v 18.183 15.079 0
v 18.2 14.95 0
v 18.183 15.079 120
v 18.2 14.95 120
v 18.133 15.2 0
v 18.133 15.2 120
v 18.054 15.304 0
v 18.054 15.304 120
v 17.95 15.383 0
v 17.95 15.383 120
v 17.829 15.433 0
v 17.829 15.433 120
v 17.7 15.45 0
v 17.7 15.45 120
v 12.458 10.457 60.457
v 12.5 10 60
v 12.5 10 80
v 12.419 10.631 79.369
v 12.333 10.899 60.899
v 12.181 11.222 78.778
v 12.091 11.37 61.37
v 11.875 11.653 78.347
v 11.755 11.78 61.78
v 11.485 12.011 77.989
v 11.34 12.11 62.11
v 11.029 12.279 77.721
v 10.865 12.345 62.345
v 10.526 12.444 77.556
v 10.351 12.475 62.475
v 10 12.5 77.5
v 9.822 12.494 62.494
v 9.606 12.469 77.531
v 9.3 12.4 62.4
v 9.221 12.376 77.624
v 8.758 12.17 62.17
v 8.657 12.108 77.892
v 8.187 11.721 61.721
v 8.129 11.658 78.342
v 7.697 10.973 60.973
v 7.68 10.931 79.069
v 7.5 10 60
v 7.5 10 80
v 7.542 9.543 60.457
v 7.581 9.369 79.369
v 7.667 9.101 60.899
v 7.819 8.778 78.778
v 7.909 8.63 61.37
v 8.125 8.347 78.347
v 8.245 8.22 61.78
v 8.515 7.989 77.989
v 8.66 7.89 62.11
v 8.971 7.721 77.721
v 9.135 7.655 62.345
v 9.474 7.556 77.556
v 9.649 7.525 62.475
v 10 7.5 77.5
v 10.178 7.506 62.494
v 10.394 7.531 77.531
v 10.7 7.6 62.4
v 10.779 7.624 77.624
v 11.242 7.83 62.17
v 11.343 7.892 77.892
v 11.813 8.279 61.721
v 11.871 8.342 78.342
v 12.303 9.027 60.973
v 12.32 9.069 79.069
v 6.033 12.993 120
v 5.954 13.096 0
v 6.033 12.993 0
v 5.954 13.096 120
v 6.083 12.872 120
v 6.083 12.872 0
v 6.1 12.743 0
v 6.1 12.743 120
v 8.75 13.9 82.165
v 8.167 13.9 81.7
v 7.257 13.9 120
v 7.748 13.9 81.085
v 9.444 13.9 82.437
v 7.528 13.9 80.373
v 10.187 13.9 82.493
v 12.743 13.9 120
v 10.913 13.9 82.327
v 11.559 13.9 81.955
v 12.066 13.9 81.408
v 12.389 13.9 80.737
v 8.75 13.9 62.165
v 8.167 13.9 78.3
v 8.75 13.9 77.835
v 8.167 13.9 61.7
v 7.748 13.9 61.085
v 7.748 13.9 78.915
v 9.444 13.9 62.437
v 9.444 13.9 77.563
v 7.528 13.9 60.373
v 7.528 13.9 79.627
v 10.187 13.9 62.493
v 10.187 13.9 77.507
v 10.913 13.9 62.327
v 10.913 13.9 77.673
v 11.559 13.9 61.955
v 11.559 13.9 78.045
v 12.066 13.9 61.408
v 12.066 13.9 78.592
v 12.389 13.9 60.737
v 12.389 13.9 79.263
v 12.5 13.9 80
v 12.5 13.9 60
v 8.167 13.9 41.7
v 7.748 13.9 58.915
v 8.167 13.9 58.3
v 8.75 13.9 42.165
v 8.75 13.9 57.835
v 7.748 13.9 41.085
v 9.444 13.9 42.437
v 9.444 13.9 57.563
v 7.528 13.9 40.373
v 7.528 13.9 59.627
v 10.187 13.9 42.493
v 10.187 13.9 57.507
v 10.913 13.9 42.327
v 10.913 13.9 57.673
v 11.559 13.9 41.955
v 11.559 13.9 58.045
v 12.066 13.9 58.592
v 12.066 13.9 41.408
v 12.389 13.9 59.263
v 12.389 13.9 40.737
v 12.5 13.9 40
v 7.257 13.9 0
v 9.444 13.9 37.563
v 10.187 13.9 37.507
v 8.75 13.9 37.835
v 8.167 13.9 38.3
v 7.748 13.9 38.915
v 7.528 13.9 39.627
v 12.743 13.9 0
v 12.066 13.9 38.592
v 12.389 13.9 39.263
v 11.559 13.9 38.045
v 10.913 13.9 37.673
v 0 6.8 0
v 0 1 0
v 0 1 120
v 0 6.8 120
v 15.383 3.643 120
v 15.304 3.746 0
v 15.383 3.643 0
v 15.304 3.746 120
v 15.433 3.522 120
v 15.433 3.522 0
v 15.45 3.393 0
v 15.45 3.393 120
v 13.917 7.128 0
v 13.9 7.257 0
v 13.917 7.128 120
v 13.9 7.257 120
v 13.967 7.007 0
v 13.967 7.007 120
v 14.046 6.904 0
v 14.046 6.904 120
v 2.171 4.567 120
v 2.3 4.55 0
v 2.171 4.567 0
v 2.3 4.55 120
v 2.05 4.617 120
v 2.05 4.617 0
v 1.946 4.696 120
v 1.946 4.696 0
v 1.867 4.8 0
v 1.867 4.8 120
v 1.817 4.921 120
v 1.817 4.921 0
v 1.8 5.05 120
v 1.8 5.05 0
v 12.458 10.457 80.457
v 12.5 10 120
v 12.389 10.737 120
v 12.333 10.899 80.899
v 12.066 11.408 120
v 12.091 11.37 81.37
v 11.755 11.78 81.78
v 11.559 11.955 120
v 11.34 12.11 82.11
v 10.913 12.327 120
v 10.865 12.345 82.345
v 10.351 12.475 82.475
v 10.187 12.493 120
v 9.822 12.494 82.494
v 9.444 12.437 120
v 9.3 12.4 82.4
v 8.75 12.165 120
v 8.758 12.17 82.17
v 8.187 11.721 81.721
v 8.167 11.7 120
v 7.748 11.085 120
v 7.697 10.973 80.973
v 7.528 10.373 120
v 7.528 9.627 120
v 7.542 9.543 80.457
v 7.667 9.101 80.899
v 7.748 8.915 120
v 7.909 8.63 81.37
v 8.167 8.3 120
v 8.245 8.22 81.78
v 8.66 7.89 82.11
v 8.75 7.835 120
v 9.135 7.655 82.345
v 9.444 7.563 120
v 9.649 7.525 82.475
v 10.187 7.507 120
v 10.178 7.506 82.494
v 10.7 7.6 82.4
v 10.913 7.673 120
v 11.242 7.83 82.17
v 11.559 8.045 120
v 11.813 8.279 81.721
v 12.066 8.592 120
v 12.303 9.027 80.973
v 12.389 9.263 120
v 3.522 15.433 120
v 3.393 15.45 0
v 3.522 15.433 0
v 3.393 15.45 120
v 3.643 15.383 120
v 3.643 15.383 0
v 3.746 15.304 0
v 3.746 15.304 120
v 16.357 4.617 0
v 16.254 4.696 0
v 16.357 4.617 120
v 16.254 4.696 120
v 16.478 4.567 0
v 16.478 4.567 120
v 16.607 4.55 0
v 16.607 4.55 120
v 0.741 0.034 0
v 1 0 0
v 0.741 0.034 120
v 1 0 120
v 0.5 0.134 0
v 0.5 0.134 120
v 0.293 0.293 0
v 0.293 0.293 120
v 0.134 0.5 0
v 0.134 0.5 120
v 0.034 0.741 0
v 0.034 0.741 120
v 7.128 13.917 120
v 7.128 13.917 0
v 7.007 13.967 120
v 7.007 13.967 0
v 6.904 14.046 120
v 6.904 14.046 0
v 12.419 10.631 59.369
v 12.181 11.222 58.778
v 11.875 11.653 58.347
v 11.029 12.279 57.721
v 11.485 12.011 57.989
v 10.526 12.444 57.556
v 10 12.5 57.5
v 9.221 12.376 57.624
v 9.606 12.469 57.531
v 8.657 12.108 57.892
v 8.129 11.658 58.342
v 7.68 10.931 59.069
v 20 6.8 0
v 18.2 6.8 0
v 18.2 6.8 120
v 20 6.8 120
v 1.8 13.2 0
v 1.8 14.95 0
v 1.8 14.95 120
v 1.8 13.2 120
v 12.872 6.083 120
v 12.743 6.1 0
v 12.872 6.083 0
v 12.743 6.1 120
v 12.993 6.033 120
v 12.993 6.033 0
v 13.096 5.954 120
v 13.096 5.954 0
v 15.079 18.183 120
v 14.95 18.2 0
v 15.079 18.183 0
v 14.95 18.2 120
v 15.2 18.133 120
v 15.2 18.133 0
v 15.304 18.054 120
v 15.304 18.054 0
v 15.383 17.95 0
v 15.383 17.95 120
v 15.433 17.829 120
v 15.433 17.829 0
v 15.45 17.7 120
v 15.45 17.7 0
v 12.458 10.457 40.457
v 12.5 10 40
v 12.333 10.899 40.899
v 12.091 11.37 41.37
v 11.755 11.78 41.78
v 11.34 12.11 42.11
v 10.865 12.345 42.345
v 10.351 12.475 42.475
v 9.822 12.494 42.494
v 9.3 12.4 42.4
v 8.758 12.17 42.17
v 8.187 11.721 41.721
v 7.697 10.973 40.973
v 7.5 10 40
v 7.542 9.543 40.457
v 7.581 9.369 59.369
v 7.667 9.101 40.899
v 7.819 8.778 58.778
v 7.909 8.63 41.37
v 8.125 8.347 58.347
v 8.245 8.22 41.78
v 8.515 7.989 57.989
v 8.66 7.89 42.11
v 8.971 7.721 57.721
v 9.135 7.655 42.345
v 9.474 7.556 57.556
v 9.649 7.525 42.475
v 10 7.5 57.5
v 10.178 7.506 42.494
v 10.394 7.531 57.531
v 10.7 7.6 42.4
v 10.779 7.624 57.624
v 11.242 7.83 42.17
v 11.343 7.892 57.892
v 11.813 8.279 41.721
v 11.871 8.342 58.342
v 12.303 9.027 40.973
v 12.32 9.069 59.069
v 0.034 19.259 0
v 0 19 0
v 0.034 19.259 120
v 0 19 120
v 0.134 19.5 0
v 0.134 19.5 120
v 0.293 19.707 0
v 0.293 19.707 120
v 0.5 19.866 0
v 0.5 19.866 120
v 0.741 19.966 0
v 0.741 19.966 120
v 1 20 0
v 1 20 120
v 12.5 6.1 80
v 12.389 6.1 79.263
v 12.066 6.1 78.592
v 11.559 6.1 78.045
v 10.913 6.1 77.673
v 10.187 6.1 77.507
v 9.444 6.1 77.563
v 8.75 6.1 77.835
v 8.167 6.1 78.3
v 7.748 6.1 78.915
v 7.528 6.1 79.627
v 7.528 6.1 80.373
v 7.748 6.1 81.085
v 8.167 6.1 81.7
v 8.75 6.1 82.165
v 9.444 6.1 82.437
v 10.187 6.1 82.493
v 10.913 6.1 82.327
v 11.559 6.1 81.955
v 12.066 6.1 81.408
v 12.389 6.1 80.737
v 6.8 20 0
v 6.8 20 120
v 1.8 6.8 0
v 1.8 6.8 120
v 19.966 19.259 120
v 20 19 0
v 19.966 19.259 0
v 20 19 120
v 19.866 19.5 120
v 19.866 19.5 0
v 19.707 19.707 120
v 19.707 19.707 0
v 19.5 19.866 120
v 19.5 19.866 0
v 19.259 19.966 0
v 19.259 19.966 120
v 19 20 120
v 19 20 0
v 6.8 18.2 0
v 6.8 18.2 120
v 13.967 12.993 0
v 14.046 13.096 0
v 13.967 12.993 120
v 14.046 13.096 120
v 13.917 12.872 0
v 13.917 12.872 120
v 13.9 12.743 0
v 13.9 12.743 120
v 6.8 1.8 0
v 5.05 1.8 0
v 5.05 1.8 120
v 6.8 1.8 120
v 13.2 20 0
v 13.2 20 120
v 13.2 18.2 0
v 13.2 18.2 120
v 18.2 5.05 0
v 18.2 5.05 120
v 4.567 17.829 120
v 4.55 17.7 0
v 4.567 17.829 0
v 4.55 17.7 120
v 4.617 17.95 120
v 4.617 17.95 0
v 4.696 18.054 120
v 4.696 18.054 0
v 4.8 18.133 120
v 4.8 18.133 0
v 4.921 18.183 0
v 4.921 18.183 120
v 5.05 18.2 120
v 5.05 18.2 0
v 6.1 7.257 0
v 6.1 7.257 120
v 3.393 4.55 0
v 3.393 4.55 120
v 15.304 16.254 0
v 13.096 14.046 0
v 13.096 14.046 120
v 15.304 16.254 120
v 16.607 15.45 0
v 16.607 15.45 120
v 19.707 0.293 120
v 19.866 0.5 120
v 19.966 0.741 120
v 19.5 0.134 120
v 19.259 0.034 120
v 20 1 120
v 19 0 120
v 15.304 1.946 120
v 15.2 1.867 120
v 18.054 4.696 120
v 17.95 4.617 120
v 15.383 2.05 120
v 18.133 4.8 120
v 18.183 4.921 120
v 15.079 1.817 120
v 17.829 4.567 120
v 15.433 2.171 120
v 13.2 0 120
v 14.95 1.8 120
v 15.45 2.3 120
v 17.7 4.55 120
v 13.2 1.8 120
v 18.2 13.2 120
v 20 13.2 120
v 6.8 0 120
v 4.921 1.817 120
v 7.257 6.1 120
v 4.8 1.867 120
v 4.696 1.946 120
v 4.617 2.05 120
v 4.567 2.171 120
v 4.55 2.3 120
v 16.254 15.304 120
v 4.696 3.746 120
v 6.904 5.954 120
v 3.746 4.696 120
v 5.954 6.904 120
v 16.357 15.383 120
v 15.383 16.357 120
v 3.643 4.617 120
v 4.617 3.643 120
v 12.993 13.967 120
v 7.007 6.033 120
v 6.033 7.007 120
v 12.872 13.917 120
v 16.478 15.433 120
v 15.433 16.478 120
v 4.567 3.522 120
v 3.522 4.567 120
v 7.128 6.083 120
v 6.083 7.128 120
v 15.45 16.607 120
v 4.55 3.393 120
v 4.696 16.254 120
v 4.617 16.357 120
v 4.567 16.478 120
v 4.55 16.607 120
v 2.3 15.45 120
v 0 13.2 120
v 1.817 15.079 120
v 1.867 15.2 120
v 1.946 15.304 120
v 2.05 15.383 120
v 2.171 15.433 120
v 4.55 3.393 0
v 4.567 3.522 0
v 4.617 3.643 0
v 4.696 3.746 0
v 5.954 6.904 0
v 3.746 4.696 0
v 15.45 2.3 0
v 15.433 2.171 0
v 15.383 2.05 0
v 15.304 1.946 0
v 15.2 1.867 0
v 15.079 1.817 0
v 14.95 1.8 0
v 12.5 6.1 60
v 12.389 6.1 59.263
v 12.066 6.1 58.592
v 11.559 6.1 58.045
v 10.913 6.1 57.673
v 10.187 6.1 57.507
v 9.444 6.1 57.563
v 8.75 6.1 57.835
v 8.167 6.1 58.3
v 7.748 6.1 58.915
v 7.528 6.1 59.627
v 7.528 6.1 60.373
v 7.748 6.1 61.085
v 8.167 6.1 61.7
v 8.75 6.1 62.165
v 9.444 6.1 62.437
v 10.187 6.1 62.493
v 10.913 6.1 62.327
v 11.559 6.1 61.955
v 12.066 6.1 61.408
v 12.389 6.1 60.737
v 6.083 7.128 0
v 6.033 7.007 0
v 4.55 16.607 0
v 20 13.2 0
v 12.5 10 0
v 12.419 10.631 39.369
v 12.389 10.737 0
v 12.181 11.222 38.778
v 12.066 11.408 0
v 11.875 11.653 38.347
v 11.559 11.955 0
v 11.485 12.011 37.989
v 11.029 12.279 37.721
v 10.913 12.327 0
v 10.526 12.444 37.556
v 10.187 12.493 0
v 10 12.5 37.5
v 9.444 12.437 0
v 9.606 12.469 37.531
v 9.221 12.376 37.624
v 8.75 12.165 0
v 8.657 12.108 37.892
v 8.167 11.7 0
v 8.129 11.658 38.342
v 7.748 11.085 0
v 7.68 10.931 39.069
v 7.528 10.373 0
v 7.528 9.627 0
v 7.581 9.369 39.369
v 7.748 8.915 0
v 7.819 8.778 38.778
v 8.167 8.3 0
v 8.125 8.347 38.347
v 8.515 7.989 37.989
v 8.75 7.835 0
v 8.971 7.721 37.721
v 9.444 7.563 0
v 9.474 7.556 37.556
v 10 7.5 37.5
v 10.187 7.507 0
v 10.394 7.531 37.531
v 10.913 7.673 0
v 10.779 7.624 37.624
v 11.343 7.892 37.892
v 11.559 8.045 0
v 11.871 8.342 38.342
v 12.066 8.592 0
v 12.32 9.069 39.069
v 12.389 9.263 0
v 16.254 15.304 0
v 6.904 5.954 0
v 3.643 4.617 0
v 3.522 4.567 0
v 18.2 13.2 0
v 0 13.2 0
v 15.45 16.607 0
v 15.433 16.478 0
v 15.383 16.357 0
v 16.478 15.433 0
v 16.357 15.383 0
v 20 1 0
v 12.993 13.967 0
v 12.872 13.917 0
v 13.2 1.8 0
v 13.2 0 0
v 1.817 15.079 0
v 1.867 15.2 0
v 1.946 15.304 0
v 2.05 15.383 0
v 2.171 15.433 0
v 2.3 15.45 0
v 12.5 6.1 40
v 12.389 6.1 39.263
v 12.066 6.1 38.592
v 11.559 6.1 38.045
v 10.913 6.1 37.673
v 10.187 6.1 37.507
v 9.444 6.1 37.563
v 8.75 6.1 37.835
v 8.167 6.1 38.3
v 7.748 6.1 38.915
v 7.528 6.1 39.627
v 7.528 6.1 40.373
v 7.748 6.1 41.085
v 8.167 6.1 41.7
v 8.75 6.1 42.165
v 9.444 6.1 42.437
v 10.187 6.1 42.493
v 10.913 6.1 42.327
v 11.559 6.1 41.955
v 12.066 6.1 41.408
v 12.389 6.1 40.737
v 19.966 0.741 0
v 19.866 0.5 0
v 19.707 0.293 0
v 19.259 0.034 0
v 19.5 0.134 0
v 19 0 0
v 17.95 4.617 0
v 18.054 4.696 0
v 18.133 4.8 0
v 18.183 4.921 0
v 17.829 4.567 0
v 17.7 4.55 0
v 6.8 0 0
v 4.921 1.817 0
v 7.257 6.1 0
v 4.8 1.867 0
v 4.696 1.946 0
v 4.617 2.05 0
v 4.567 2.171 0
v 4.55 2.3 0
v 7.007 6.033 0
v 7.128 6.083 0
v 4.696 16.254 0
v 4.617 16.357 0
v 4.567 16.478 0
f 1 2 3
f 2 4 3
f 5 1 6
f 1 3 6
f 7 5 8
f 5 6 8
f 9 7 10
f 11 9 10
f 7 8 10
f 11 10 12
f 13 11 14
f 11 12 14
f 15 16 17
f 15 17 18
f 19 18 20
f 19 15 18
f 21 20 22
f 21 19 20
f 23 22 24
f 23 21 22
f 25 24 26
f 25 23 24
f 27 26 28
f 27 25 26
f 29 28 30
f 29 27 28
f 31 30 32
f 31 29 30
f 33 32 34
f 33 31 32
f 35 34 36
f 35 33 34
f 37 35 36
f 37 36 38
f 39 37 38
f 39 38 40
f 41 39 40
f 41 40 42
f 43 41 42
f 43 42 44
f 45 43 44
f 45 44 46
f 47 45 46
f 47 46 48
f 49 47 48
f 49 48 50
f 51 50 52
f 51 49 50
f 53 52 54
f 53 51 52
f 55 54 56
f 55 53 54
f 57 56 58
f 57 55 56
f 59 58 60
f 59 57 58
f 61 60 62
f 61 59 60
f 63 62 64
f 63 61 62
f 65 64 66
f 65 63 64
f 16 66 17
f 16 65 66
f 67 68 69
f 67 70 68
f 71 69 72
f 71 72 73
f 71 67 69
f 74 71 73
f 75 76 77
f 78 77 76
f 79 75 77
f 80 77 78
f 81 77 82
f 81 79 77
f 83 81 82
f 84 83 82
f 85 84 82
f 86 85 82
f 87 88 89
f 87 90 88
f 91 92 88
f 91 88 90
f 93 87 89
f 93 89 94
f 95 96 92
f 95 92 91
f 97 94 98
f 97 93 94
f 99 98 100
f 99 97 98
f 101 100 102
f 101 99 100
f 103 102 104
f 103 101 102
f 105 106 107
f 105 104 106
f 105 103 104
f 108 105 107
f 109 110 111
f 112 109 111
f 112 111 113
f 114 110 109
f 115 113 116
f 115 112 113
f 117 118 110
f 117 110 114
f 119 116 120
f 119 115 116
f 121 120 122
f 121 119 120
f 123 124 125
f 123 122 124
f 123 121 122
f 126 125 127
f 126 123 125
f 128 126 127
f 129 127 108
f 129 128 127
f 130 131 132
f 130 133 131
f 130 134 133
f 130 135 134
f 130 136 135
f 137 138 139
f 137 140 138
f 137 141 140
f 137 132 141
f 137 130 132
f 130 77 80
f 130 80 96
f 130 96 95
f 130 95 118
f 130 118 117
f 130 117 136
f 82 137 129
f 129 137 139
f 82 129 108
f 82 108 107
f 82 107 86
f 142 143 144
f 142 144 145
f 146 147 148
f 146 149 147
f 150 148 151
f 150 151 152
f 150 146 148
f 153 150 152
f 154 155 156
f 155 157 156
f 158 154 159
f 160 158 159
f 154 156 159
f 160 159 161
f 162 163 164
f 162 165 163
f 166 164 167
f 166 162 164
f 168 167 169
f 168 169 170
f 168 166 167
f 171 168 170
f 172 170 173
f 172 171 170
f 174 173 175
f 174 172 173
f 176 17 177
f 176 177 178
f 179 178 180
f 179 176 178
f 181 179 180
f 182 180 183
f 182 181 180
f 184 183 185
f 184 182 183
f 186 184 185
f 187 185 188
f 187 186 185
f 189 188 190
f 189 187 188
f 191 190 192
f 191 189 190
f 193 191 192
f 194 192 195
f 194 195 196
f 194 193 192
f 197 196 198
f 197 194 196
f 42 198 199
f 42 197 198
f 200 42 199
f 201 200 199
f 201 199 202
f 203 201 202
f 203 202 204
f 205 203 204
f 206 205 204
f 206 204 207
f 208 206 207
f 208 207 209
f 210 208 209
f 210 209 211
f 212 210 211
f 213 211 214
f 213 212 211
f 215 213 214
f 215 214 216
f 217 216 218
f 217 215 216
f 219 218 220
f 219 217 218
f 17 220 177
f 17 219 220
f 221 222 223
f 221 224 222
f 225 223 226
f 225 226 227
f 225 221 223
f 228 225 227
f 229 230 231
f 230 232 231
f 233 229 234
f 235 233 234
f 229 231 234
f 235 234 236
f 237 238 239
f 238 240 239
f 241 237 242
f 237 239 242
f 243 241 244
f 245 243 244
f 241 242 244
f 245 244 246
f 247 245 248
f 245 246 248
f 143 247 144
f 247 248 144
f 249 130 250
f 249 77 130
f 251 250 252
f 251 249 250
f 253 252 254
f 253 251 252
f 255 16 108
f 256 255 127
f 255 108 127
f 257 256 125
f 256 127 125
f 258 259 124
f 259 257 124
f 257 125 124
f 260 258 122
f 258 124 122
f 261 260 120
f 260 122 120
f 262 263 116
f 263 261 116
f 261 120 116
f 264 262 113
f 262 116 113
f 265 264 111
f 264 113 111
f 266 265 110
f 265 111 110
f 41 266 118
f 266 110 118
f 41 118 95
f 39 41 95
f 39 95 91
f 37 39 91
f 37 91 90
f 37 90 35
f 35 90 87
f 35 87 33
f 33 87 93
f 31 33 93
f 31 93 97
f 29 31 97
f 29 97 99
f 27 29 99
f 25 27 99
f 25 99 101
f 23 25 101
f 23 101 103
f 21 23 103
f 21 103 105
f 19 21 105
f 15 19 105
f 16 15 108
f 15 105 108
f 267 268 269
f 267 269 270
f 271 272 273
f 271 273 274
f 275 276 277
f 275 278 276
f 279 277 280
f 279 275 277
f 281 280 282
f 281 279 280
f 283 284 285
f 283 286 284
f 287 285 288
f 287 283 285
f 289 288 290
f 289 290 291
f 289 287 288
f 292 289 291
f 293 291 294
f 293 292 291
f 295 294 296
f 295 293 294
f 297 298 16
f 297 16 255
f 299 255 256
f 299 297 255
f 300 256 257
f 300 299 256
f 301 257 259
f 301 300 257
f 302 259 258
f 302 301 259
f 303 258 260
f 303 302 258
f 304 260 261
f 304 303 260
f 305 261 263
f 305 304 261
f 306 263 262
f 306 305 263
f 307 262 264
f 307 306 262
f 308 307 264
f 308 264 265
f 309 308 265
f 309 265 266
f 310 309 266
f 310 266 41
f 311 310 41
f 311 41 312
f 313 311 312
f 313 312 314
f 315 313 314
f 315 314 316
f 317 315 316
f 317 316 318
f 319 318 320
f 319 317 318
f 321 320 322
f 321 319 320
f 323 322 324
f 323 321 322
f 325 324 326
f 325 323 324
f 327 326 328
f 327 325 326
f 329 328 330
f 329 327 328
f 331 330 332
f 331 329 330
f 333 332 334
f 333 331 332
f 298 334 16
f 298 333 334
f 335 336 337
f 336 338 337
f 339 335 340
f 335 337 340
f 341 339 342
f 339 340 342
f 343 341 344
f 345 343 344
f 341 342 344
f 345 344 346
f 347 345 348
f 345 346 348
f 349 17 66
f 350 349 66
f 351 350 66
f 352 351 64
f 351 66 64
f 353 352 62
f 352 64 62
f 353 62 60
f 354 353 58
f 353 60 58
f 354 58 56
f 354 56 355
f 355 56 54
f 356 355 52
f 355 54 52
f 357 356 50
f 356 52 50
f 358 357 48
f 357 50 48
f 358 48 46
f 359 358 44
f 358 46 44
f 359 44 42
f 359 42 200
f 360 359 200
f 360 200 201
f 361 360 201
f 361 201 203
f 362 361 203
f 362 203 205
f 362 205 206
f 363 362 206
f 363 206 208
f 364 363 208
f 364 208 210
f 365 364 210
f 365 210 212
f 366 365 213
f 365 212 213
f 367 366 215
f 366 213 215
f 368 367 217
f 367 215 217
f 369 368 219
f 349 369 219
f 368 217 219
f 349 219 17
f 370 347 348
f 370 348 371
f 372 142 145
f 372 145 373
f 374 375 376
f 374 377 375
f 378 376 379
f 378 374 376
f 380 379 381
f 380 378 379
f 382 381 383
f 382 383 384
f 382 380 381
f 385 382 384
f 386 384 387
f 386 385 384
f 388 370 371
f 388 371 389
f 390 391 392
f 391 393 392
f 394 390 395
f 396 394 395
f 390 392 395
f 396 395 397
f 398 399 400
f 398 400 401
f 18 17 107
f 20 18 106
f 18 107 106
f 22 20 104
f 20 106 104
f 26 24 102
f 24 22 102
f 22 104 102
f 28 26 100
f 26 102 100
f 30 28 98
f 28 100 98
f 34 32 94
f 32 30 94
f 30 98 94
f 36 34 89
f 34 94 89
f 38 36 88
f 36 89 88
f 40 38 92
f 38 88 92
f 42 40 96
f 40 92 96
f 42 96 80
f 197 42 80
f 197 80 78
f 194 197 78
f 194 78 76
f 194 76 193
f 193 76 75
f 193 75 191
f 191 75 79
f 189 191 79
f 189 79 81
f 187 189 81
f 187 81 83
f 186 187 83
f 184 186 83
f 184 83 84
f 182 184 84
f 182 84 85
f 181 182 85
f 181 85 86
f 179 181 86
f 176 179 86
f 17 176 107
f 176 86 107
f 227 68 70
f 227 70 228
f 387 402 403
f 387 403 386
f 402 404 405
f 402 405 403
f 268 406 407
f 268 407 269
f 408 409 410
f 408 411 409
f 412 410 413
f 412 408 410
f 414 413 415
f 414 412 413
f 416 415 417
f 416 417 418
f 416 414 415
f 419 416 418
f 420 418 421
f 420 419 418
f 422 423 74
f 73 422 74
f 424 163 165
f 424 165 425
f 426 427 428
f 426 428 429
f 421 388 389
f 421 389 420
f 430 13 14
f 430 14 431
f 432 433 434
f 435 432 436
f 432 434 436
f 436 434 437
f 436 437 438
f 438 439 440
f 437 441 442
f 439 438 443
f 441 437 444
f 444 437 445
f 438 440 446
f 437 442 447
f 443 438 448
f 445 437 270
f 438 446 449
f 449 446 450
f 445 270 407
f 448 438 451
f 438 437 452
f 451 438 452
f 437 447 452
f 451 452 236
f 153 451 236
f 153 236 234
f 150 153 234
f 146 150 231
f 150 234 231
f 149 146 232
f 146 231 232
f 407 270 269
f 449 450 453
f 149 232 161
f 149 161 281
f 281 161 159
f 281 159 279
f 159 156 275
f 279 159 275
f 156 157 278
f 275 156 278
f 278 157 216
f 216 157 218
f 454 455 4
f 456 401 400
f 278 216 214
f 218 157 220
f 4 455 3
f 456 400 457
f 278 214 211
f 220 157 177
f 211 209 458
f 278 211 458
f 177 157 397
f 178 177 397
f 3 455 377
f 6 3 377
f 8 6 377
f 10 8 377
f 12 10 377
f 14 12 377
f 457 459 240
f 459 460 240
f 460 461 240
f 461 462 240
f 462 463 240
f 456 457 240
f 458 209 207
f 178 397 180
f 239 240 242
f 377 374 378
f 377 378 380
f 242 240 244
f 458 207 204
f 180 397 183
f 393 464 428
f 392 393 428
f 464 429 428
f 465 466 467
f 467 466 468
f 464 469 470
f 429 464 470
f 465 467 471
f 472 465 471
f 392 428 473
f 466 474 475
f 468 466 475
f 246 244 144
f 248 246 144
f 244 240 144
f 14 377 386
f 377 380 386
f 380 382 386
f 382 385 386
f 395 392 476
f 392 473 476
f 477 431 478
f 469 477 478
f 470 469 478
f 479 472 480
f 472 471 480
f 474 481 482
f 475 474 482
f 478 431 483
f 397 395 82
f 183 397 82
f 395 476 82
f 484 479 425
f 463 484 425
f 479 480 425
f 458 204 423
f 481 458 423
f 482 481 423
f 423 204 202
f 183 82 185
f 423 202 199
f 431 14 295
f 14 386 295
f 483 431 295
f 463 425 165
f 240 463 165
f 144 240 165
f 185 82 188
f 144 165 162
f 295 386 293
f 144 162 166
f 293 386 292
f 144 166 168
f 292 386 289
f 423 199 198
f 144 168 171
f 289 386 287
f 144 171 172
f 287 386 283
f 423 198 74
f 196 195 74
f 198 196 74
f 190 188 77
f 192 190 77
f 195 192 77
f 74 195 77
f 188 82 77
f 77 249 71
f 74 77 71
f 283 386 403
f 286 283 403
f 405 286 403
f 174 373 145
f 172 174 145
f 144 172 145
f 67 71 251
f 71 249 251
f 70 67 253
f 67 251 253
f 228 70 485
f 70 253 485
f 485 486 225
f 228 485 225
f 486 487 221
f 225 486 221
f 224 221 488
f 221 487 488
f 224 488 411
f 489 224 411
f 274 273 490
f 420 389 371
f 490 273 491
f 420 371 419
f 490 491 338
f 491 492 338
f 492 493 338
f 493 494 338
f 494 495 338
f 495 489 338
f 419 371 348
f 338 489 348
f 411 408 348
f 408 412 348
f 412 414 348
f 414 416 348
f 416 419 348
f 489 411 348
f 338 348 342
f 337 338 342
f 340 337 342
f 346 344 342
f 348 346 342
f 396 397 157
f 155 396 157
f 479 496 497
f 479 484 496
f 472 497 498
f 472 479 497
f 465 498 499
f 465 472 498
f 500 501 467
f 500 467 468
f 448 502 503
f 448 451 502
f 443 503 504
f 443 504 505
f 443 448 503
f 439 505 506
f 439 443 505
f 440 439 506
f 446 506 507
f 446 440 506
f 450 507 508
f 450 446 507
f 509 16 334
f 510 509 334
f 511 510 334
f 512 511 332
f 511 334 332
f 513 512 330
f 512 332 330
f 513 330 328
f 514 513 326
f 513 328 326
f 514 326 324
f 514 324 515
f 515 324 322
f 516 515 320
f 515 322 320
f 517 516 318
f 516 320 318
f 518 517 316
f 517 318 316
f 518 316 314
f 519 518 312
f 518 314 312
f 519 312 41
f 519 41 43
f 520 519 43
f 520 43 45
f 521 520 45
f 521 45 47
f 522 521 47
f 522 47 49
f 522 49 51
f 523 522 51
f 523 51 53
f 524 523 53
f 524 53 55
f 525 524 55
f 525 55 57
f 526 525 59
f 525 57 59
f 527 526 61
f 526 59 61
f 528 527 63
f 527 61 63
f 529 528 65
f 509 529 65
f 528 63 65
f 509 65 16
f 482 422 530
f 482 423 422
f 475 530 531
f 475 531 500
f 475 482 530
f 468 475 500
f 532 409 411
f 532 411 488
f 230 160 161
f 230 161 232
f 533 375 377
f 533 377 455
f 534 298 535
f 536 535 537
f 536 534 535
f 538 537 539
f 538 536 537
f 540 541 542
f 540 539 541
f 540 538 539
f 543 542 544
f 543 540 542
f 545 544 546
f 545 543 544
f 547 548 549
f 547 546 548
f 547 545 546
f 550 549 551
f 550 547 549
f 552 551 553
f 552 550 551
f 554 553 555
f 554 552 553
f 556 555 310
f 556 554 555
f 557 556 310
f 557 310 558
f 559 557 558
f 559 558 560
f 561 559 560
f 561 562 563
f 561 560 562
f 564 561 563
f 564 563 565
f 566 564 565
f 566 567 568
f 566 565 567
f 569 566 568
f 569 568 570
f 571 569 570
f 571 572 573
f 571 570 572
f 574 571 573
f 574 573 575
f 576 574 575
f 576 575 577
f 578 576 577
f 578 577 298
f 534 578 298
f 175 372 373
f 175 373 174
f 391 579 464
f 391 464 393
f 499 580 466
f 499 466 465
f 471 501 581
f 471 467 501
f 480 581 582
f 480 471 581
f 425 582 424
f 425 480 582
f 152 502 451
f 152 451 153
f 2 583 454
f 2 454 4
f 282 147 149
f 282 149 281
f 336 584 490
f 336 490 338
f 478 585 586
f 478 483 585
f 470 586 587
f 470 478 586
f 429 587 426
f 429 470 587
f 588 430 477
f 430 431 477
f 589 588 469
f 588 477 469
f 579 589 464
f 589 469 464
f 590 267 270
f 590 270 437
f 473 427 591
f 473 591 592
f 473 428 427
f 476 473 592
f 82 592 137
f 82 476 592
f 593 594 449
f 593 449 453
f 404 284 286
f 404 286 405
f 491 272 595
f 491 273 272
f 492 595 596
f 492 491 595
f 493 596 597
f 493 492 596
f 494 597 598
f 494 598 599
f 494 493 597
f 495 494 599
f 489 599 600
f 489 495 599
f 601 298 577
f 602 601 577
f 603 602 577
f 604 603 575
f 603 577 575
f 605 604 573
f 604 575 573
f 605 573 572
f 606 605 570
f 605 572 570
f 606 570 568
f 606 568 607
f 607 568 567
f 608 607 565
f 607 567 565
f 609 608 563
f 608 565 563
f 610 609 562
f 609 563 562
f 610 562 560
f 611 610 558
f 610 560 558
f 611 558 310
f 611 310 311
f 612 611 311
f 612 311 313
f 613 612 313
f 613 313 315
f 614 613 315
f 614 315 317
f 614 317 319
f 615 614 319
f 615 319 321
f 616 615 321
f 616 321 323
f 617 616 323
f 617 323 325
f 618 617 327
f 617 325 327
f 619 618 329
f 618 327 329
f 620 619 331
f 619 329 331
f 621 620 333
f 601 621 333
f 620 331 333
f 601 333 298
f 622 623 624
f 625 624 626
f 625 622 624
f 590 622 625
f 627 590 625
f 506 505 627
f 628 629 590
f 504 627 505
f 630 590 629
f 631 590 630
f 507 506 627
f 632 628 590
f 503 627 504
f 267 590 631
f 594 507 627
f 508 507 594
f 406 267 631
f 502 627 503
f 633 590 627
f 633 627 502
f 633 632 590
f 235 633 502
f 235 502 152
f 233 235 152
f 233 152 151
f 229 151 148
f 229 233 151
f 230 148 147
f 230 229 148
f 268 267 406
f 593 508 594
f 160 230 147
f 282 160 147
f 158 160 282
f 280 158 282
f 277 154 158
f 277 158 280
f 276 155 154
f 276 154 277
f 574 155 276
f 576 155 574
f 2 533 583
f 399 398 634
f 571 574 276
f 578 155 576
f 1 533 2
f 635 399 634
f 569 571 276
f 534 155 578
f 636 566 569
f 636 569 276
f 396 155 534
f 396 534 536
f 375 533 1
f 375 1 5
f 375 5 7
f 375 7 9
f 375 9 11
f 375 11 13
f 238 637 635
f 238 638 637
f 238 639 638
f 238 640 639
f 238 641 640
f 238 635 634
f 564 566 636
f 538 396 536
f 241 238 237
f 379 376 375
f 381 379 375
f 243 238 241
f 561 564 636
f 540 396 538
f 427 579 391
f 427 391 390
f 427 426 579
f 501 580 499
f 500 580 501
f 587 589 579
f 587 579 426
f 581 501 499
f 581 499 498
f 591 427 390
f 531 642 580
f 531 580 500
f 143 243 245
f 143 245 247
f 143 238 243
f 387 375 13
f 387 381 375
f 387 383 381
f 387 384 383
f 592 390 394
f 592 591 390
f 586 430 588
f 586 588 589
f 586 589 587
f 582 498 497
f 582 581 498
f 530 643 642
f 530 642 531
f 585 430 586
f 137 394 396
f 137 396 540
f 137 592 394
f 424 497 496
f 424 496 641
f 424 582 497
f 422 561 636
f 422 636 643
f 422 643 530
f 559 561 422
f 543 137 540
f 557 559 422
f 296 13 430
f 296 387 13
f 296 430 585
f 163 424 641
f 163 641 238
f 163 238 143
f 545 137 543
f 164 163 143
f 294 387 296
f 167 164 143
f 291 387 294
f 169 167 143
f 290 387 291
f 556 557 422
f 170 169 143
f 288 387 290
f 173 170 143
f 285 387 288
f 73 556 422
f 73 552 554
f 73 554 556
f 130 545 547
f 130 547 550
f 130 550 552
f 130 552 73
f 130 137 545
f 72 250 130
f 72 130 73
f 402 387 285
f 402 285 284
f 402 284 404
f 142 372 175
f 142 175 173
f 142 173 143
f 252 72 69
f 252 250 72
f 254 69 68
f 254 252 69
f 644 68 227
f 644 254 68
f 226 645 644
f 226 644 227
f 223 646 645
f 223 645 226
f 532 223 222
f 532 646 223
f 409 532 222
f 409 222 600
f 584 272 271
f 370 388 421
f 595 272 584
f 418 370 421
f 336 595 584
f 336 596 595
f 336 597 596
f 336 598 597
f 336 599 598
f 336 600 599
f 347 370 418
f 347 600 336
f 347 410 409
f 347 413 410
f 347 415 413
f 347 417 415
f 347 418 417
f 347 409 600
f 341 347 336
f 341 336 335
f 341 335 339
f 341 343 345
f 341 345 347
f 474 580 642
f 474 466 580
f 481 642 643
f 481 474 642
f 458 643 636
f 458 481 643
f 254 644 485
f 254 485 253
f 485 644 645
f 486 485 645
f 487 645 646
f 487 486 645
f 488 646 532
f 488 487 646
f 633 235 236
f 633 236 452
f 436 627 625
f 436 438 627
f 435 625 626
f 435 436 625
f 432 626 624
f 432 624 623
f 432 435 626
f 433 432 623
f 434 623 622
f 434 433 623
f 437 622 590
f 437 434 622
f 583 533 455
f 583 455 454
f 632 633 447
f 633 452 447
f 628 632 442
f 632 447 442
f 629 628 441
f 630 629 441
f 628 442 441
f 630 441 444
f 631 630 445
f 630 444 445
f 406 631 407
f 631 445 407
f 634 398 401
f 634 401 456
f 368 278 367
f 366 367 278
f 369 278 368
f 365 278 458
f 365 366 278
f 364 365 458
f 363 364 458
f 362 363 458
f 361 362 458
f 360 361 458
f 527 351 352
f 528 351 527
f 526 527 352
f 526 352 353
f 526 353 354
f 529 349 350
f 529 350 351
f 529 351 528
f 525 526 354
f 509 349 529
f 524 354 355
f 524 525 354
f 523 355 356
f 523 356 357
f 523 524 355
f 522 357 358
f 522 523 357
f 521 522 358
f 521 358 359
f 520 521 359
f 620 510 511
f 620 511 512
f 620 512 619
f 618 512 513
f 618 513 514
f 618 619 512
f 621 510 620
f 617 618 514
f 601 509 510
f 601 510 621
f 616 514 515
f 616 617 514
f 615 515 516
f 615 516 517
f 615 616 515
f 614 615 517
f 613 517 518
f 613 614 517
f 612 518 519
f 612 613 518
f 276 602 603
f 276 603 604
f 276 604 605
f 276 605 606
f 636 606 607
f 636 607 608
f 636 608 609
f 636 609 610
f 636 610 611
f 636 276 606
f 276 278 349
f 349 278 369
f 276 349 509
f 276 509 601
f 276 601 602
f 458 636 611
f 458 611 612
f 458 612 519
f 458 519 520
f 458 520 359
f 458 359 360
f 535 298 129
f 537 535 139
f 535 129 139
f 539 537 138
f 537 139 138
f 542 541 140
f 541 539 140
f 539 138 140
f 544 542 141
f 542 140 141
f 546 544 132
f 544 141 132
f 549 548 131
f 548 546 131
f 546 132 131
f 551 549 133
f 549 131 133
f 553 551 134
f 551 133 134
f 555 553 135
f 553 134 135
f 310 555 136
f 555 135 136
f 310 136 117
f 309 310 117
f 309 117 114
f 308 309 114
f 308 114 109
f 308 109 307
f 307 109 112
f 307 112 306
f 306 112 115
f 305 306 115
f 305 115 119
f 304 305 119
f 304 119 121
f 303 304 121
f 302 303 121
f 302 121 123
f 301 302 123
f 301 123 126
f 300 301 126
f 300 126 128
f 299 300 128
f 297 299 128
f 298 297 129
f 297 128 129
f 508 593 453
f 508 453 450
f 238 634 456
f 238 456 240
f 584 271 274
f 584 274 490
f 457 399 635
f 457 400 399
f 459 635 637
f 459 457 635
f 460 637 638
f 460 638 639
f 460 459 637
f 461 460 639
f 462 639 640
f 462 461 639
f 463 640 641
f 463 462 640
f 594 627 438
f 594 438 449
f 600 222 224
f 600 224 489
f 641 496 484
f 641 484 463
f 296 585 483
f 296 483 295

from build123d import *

# Parameters (mm, degrees)
SKETCH1_R           = 2.5
BOSS_EXTRUDE1_DEPTH = 120
FILLET1_R           = 1
FILLET2_R           = 0.5
FILLET3_R           = 0.5
FILLET4_R           = 0.5
FILLET5_R           = 0.5
SKETCH2_R           = 2.5
CUT_EXTRUDE1_DEPTH  = 8


with BuildPart() as part:
    # Sketch1 → Boss-Extrude1 (new body)
    with BuildSketch(Plane.XY):
        Polygon((13.2, 0), (13.2, 1.8), (15.45, 1.8), (15.45, 3.6), (12.95, 6.1), (7.05, 6.1), (4.55, 3.6), (4.55, 1.8), (6.8, 1.8), (6.8, 0), (0, 0), (0, 6.8), (1.8, 6.8), (1.8, 4.55), (3.6, 4.55), (6.1, 7.05), (6.1, 12.95), (3.6, 15.45), (1.8, 15.45), (1.8, 13.2), (0, 13.2), (0, 20), (6.8, 20), (6.8, 18.2), (4.55, 18.2), (4.55, 16.4), (7.05, 13.9), (12.95, 13.9), (15.45, 16.4), (15.45, 18.2), (13.2, 18.2), (13.2, 20), (20, 20), (20, 13.2), (18.2, 13.2), (18.2, 15.45), (16.4, 15.45), (13.9, 12.95), (13.9, 7.05), (16.4, 4.55), (18.2, 4.55), (18.2, 6.8), (20, 6.8), (20, 0), align=None)
        with Locations((10, 10)):
            Circle(SKETCH1_R, mode=Mode.SUBTRACT)
    extrude(amount=BOSS_EXTRUDE1_DEPTH)

    # Fillet1
    fillet1_edges = [part.edges().sort_by_distance(p)[0] for p in [
        (0, 0, 60),
        (0, 20, 60),
        (20, 20, 60),
        (20, 0, 60),
    ]]
    fillet(fillet1_edges, radius=FILLET1_R)

    # Fillet2
    fillet2_edges = [part.edges().sort_by_distance(p)[0] for p in [
        (4.55, 18.2, 60),
        (4.55, 16.4, 60),
        (7.05, 13.9, 60),
        (12.95, 13.9, 60),
        (15.45, 16.4, 60),
        (15.45, 18.2, 60),
    ]]
    fillet(fillet2_edges, radius=FILLET2_R)

    # Fillet3
    fillet3_edges = [part.edges().sort_by_distance(p)[0] for p in [
        (18.2, 15.45, 60),
        (16.4, 15.45, 60),
        (13.9, 12.95, 60),
        (13.9, 7.05, 60),
        (16.4, 4.55, 60),
        (18.2, 4.55, 60),
    ]]
    fillet(fillet3_edges, radius=FILLET3_R)

    # Fillet4
    fillet4_edges = [part.edges().sort_by_distance(p)[0] for p in [
        (1.8, 4.55, 60),
        (3.6, 4.55, 60),
        (6.1, 7.05, 60),
        (6.1, 12.95, 60),
        (3.6, 15.45, 60),
        (1.8, 15.45, 60),
    ]]
    fillet(fillet4_edges, radius=FILLET4_R)

    # Fillet5
    fillet5_edges = [part.edges().sort_by_distance(p)[0] for p in [
        (15.45, 1.8, 60),
        (15.45, 3.6, 60),
        (12.95, 6.1, 60),
        (7.05, 6.1, 60),
        (4.55, 3.6, 60),
        (4.55, 1.8, 60),
    ]]
    fillet(fillet5_edges, radius=FILLET5_R)

    # Sketch2 → Cut-Extrude1 (cut)
    with BuildSketch(Plane(origin=(0, 13.9, 0), x_dir=(1, 0, 0), z_dir=(0, 1, 0))):
        with Locations((10, -60)):
            Circle(SKETCH2_R)
        with Locations((10, -80)):
            Circle(SKETCH2_R)
        with Locations((10, -40)):
            Circle(SKETCH2_R)
    extrude(amount=-CUT_EXTRUDE1_DEPTH, mode=Mode.SUBTRACT)


solid = part.part
